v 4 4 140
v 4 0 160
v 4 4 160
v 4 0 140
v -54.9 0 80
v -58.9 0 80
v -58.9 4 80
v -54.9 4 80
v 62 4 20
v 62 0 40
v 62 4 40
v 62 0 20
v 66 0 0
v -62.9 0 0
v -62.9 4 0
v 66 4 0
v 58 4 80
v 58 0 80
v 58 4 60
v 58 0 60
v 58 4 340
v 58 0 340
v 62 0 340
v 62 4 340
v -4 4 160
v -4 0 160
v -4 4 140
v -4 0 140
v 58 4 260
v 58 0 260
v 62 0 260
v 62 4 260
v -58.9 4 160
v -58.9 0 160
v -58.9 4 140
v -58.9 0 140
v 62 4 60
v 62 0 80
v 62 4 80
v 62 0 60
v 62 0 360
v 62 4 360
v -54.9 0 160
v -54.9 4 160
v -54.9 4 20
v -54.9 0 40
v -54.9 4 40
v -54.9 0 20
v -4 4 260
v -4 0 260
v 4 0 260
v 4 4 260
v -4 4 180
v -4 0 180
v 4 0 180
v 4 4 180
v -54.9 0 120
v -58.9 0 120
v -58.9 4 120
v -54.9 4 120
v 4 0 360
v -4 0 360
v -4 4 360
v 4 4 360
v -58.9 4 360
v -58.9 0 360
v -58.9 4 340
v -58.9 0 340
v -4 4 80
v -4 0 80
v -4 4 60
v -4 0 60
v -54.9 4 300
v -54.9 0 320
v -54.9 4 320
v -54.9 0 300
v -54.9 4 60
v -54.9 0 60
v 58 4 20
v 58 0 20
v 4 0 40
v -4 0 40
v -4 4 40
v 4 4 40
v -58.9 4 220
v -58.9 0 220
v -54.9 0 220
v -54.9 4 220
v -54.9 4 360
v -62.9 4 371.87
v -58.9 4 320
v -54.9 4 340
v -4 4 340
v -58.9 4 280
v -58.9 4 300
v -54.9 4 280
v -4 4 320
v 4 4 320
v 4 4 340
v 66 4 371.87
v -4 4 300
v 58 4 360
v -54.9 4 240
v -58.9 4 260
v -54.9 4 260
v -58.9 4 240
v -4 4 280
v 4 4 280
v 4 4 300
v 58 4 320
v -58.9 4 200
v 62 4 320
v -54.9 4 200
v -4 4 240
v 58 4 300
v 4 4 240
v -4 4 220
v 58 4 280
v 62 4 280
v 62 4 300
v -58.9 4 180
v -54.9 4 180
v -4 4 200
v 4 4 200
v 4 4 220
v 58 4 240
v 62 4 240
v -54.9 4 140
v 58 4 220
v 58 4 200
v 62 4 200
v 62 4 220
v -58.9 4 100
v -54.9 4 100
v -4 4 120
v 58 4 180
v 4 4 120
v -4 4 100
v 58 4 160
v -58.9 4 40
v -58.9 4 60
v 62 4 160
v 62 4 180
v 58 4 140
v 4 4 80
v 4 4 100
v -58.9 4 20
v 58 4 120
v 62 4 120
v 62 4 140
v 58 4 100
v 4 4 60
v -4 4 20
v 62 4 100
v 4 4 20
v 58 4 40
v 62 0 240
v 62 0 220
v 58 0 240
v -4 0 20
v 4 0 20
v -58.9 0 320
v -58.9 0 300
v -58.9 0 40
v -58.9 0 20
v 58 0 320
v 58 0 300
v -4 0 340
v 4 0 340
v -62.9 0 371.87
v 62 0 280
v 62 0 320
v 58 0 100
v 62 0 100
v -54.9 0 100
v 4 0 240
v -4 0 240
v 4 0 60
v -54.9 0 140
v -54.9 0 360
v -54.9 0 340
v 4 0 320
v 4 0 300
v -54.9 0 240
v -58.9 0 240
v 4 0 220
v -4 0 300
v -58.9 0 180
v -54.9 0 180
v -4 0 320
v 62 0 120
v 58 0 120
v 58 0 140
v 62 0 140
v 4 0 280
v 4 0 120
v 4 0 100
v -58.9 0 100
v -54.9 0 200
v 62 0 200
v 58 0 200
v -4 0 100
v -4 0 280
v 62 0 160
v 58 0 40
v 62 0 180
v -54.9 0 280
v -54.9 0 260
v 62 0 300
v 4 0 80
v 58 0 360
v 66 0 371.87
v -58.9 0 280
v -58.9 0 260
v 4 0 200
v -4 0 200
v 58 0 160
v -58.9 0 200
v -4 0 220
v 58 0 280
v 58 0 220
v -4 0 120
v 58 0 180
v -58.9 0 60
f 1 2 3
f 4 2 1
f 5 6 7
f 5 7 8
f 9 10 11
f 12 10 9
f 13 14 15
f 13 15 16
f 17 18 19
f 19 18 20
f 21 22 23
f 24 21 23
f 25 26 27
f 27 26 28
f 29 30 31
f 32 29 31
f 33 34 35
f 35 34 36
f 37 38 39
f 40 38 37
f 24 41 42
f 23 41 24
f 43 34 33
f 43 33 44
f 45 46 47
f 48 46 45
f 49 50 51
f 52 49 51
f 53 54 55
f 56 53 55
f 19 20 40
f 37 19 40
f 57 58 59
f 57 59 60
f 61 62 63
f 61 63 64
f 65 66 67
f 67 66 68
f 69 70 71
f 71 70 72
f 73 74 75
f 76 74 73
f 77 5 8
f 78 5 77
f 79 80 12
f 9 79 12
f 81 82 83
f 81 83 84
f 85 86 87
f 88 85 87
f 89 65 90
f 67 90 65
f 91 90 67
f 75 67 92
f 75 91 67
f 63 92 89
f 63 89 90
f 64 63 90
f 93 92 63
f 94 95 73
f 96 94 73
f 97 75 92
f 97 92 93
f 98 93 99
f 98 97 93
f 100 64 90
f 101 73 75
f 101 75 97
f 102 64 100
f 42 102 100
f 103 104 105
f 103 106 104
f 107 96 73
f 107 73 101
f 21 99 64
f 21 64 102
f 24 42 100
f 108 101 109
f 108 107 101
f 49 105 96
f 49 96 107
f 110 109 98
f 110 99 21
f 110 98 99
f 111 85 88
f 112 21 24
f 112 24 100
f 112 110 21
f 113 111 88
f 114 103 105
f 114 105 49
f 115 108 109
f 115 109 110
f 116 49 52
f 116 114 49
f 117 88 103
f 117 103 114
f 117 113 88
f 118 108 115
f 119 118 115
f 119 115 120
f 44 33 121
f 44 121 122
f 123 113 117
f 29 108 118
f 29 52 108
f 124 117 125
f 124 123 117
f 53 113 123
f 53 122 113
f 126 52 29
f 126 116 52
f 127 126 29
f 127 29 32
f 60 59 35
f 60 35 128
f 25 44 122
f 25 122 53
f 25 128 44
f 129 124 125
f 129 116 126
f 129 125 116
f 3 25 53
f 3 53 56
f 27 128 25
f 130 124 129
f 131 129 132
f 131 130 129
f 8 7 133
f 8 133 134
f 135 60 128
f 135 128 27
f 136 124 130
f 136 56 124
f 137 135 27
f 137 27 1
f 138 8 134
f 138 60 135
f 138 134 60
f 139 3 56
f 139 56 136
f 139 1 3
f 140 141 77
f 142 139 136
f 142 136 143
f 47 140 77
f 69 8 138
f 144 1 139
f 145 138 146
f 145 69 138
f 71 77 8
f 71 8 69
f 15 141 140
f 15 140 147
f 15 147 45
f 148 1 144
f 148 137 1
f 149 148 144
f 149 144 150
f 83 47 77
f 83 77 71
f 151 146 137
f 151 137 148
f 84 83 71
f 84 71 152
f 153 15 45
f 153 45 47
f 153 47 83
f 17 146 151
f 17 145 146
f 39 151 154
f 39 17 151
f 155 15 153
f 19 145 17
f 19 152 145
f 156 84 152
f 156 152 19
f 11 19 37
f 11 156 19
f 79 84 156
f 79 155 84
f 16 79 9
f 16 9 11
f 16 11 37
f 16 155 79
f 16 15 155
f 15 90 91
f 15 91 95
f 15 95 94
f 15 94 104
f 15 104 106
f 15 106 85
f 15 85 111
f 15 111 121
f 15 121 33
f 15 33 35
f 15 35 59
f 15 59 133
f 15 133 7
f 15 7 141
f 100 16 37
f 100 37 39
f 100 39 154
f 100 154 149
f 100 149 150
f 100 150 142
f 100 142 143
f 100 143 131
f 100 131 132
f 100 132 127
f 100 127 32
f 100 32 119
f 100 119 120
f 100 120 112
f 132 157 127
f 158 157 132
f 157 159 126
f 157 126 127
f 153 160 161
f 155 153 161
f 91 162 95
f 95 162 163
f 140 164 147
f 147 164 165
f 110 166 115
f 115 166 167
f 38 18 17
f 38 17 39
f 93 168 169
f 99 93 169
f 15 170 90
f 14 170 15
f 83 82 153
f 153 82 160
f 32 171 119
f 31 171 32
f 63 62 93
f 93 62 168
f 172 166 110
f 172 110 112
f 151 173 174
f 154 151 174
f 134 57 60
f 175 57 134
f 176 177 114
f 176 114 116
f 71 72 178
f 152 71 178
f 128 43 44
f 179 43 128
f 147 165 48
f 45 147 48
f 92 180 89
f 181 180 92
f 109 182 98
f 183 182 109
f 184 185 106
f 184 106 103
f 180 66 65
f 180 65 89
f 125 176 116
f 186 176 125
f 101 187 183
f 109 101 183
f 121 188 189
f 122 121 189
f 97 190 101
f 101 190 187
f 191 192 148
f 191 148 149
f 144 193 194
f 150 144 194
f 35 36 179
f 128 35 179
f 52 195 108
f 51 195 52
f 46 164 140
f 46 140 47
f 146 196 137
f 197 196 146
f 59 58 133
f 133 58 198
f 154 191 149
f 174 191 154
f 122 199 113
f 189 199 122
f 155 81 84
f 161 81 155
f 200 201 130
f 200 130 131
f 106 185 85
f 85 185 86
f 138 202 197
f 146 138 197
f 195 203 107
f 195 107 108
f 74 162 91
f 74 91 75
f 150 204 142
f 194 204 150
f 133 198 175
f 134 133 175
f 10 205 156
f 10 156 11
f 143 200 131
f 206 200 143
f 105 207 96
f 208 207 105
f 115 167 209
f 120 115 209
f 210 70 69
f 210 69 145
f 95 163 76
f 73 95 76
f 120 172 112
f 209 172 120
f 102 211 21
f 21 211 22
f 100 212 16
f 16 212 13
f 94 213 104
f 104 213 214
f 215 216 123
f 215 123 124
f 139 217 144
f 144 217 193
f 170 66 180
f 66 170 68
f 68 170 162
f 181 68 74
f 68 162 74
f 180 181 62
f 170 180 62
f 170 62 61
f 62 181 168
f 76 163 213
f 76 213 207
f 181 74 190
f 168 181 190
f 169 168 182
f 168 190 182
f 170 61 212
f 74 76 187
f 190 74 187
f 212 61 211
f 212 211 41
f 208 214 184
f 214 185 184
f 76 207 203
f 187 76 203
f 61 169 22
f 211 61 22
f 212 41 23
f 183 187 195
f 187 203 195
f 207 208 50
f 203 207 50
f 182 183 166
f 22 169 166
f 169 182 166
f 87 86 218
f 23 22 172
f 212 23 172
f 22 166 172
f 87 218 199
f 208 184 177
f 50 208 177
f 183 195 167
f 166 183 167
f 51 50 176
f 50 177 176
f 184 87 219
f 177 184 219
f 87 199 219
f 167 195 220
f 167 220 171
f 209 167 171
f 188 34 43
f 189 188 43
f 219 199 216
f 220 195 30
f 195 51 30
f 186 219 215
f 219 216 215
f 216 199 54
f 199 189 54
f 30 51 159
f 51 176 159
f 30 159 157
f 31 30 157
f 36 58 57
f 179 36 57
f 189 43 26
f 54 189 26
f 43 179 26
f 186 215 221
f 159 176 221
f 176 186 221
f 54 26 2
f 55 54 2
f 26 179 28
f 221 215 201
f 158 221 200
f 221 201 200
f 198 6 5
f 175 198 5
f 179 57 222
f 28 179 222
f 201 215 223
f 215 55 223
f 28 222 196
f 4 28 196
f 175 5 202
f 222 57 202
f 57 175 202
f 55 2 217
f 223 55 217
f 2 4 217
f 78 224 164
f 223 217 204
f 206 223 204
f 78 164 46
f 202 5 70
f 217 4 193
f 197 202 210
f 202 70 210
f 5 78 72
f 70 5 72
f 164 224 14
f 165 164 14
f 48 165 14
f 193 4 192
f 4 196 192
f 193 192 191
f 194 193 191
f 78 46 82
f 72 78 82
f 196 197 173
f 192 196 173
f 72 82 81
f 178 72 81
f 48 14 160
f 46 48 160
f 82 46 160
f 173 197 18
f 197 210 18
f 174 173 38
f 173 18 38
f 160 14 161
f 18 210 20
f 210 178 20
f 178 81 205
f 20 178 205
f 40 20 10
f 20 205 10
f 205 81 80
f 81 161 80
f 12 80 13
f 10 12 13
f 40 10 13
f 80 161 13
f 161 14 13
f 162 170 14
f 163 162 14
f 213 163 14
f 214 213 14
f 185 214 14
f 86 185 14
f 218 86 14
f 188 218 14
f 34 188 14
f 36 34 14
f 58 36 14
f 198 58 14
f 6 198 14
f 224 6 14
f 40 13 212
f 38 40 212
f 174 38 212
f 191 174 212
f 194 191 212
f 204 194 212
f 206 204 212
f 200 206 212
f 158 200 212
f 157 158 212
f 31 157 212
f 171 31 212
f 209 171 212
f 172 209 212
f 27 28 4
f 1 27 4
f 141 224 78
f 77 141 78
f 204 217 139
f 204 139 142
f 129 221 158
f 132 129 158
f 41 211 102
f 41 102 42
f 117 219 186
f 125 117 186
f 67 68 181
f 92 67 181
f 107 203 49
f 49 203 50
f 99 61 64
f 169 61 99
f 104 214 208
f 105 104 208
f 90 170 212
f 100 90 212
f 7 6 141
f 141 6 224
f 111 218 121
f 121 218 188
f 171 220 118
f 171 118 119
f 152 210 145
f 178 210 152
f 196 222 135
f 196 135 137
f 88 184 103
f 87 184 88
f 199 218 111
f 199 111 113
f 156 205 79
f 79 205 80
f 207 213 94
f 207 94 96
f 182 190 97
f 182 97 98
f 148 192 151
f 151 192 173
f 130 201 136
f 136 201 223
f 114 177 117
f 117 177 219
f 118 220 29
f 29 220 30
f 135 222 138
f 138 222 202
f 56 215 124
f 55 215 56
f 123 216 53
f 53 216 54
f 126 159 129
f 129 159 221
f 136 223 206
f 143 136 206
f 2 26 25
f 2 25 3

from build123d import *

# Parameters (mm, degrees)
SKETCH_1_W      = 128.9
SKETCH_1_H      = 371.87
SKETCH_1_W_2    = 8
SKETCH_1_H_2    = 20
SKETCH_1_W_3    = 4
EXTRUDE_1_DEPTH = 4


with BuildPart() as part:
    # Эскиз1 → Бобышка-Вытянуть1 (new body)
    with BuildSketch(Plane(origin=(0, 0, 0), x_dir=(1, 0, 0), z_dir=(0, 1, 0))):
        with Locations((1.55, -185.935)):
            Rectangle(SKETCH_1_W, SKETCH_1_H)
        with Locations((0, -70)):
            Rectangle(SKETCH_1_W_2, SKETCH_1_H_2, mode=Mode.SUBTRACT)
        with Locations((0, -30)):
            Rectangle(SKETCH_1_W_2, SKETCH_1_H_2, mode=Mode.SUBTRACT)
        with Locations((0, -110)):
            Rectangle(SKETCH_1_W_2, SKETCH_1_H_2, mode=Mode.SUBTRACT)
        with Locations((0, -150)):
            Rectangle(SKETCH_1_W_2, SKETCH_1_H_2, mode=Mode.SUBTRACT)
        with Locations((0, -190)):
            Rectangle(SKETCH_1_W_2, SKETCH_1_H_2, mode=Mode.SUBTRACT)
        with Locations((0, -230)):
            Rectangle(SKETCH_1_W_2, SKETCH_1_H_2, mode=Mode.SUBTRACT)
        with Locations((0, -270)):
            Rectangle(SKETCH_1_W_2, SKETCH_1_H_2, mode=Mode.SUBTRACT)
        with Locations((0, -310)):
            Rectangle(SKETCH_1_W_2, SKETCH_1_H_2, mode=Mode.SUBTRACT)
        with Locations((0, -350)):
            Rectangle(SKETCH_1_W_2, SKETCH_1_H_2, mode=Mode.SUBTRACT)
        with Locations((-56.9, -30)):
            Rectangle(SKETCH_1_W_3, SKETCH_1_H_2, mode=Mode.SUBTRACT)
        with Locations((-56.9, -70)):
            Rectangle(SKETCH_1_W_3, SKETCH_1_H_2, mode=Mode.SUBTRACT)
        with Locations((-56.9, -110)):
            Rectangle(SKETCH_1_W_3, SKETCH_1_H_2, mode=Mode.SUBTRACT)
        with Locations((-56.9, -150)):
            Rectangle(SKETCH_1_W_3, SKETCH_1_H_2, mode=Mode.SUBTRACT)
        with Locations((-56.9, -190)):
            Rectangle(SKETCH_1_W_3, SKETCH_1_H_2, mode=Mode.SUBTRACT)
        with Locations((-56.9, -230)):
            Rectangle(SKETCH_1_W_3, SKETCH_1_H_2, mode=Mode.SUBTRACT)
        with Locations((-56.9, -270)):
            Rectangle(SKETCH_1_W_3, SKETCH_1_H_2, mode=Mode.SUBTRACT)
        with Locations((-56.9, -310)):
            Rectangle(SKETCH_1_W_3, SKETCH_1_H_2, mode=Mode.SUBTRACT)
        with Locations((-56.9, -350)):
            Rectangle(SKETCH_1_W_3, SKETCH_1_H_2, mode=Mode.SUBTRACT)
        with Locations((60, -70)):
            Rectangle(SKETCH_1_W_3, SKETCH_1_H_2, mode=Mode.SUBTRACT)
        with Locations((60, -30)):
            Rectangle(SKETCH_1_W_3, SKETCH_1_H_2, mode=Mode.SUBTRACT)
        with Locations((60, -110)):
            Rectangle(SKETCH_1_W_3, SKETCH_1_H_2, mode=Mode.SUBTRACT)
        with Locations((60, -150)):
            Rectangle(SKETCH_1_W_3, SKETCH_1_H_2, mode=Mode.SUBTRACT)
        with Locations((60, -190)):
            Rectangle(SKETCH_1_W_3, SKETCH_1_H_2, mode=Mode.SUBTRACT)
        with Locations((60, -230)):
            Rectangle(SKETCH_1_W_3, SKETCH_1_H_2, mode=Mode.SUBTRACT)
        with Locations((60, -270)):
            Rectangle(SKETCH_1_W_3, SKETCH_1_H_2, mode=Mode.SUBTRACT)
        with Locations((60, -310)):
            Rectangle(SKETCH_1_W_3, SKETCH_1_H_2, mode=Mode.SUBTRACT)
        with Locations((60, -350)):
            Rectangle(SKETCH_1_W_3, SKETCH_1_H_2, mode=Mode.SUBTRACT)
    extrude(amount=EXTRUDE_1_DEPTH)


solid = part.part
